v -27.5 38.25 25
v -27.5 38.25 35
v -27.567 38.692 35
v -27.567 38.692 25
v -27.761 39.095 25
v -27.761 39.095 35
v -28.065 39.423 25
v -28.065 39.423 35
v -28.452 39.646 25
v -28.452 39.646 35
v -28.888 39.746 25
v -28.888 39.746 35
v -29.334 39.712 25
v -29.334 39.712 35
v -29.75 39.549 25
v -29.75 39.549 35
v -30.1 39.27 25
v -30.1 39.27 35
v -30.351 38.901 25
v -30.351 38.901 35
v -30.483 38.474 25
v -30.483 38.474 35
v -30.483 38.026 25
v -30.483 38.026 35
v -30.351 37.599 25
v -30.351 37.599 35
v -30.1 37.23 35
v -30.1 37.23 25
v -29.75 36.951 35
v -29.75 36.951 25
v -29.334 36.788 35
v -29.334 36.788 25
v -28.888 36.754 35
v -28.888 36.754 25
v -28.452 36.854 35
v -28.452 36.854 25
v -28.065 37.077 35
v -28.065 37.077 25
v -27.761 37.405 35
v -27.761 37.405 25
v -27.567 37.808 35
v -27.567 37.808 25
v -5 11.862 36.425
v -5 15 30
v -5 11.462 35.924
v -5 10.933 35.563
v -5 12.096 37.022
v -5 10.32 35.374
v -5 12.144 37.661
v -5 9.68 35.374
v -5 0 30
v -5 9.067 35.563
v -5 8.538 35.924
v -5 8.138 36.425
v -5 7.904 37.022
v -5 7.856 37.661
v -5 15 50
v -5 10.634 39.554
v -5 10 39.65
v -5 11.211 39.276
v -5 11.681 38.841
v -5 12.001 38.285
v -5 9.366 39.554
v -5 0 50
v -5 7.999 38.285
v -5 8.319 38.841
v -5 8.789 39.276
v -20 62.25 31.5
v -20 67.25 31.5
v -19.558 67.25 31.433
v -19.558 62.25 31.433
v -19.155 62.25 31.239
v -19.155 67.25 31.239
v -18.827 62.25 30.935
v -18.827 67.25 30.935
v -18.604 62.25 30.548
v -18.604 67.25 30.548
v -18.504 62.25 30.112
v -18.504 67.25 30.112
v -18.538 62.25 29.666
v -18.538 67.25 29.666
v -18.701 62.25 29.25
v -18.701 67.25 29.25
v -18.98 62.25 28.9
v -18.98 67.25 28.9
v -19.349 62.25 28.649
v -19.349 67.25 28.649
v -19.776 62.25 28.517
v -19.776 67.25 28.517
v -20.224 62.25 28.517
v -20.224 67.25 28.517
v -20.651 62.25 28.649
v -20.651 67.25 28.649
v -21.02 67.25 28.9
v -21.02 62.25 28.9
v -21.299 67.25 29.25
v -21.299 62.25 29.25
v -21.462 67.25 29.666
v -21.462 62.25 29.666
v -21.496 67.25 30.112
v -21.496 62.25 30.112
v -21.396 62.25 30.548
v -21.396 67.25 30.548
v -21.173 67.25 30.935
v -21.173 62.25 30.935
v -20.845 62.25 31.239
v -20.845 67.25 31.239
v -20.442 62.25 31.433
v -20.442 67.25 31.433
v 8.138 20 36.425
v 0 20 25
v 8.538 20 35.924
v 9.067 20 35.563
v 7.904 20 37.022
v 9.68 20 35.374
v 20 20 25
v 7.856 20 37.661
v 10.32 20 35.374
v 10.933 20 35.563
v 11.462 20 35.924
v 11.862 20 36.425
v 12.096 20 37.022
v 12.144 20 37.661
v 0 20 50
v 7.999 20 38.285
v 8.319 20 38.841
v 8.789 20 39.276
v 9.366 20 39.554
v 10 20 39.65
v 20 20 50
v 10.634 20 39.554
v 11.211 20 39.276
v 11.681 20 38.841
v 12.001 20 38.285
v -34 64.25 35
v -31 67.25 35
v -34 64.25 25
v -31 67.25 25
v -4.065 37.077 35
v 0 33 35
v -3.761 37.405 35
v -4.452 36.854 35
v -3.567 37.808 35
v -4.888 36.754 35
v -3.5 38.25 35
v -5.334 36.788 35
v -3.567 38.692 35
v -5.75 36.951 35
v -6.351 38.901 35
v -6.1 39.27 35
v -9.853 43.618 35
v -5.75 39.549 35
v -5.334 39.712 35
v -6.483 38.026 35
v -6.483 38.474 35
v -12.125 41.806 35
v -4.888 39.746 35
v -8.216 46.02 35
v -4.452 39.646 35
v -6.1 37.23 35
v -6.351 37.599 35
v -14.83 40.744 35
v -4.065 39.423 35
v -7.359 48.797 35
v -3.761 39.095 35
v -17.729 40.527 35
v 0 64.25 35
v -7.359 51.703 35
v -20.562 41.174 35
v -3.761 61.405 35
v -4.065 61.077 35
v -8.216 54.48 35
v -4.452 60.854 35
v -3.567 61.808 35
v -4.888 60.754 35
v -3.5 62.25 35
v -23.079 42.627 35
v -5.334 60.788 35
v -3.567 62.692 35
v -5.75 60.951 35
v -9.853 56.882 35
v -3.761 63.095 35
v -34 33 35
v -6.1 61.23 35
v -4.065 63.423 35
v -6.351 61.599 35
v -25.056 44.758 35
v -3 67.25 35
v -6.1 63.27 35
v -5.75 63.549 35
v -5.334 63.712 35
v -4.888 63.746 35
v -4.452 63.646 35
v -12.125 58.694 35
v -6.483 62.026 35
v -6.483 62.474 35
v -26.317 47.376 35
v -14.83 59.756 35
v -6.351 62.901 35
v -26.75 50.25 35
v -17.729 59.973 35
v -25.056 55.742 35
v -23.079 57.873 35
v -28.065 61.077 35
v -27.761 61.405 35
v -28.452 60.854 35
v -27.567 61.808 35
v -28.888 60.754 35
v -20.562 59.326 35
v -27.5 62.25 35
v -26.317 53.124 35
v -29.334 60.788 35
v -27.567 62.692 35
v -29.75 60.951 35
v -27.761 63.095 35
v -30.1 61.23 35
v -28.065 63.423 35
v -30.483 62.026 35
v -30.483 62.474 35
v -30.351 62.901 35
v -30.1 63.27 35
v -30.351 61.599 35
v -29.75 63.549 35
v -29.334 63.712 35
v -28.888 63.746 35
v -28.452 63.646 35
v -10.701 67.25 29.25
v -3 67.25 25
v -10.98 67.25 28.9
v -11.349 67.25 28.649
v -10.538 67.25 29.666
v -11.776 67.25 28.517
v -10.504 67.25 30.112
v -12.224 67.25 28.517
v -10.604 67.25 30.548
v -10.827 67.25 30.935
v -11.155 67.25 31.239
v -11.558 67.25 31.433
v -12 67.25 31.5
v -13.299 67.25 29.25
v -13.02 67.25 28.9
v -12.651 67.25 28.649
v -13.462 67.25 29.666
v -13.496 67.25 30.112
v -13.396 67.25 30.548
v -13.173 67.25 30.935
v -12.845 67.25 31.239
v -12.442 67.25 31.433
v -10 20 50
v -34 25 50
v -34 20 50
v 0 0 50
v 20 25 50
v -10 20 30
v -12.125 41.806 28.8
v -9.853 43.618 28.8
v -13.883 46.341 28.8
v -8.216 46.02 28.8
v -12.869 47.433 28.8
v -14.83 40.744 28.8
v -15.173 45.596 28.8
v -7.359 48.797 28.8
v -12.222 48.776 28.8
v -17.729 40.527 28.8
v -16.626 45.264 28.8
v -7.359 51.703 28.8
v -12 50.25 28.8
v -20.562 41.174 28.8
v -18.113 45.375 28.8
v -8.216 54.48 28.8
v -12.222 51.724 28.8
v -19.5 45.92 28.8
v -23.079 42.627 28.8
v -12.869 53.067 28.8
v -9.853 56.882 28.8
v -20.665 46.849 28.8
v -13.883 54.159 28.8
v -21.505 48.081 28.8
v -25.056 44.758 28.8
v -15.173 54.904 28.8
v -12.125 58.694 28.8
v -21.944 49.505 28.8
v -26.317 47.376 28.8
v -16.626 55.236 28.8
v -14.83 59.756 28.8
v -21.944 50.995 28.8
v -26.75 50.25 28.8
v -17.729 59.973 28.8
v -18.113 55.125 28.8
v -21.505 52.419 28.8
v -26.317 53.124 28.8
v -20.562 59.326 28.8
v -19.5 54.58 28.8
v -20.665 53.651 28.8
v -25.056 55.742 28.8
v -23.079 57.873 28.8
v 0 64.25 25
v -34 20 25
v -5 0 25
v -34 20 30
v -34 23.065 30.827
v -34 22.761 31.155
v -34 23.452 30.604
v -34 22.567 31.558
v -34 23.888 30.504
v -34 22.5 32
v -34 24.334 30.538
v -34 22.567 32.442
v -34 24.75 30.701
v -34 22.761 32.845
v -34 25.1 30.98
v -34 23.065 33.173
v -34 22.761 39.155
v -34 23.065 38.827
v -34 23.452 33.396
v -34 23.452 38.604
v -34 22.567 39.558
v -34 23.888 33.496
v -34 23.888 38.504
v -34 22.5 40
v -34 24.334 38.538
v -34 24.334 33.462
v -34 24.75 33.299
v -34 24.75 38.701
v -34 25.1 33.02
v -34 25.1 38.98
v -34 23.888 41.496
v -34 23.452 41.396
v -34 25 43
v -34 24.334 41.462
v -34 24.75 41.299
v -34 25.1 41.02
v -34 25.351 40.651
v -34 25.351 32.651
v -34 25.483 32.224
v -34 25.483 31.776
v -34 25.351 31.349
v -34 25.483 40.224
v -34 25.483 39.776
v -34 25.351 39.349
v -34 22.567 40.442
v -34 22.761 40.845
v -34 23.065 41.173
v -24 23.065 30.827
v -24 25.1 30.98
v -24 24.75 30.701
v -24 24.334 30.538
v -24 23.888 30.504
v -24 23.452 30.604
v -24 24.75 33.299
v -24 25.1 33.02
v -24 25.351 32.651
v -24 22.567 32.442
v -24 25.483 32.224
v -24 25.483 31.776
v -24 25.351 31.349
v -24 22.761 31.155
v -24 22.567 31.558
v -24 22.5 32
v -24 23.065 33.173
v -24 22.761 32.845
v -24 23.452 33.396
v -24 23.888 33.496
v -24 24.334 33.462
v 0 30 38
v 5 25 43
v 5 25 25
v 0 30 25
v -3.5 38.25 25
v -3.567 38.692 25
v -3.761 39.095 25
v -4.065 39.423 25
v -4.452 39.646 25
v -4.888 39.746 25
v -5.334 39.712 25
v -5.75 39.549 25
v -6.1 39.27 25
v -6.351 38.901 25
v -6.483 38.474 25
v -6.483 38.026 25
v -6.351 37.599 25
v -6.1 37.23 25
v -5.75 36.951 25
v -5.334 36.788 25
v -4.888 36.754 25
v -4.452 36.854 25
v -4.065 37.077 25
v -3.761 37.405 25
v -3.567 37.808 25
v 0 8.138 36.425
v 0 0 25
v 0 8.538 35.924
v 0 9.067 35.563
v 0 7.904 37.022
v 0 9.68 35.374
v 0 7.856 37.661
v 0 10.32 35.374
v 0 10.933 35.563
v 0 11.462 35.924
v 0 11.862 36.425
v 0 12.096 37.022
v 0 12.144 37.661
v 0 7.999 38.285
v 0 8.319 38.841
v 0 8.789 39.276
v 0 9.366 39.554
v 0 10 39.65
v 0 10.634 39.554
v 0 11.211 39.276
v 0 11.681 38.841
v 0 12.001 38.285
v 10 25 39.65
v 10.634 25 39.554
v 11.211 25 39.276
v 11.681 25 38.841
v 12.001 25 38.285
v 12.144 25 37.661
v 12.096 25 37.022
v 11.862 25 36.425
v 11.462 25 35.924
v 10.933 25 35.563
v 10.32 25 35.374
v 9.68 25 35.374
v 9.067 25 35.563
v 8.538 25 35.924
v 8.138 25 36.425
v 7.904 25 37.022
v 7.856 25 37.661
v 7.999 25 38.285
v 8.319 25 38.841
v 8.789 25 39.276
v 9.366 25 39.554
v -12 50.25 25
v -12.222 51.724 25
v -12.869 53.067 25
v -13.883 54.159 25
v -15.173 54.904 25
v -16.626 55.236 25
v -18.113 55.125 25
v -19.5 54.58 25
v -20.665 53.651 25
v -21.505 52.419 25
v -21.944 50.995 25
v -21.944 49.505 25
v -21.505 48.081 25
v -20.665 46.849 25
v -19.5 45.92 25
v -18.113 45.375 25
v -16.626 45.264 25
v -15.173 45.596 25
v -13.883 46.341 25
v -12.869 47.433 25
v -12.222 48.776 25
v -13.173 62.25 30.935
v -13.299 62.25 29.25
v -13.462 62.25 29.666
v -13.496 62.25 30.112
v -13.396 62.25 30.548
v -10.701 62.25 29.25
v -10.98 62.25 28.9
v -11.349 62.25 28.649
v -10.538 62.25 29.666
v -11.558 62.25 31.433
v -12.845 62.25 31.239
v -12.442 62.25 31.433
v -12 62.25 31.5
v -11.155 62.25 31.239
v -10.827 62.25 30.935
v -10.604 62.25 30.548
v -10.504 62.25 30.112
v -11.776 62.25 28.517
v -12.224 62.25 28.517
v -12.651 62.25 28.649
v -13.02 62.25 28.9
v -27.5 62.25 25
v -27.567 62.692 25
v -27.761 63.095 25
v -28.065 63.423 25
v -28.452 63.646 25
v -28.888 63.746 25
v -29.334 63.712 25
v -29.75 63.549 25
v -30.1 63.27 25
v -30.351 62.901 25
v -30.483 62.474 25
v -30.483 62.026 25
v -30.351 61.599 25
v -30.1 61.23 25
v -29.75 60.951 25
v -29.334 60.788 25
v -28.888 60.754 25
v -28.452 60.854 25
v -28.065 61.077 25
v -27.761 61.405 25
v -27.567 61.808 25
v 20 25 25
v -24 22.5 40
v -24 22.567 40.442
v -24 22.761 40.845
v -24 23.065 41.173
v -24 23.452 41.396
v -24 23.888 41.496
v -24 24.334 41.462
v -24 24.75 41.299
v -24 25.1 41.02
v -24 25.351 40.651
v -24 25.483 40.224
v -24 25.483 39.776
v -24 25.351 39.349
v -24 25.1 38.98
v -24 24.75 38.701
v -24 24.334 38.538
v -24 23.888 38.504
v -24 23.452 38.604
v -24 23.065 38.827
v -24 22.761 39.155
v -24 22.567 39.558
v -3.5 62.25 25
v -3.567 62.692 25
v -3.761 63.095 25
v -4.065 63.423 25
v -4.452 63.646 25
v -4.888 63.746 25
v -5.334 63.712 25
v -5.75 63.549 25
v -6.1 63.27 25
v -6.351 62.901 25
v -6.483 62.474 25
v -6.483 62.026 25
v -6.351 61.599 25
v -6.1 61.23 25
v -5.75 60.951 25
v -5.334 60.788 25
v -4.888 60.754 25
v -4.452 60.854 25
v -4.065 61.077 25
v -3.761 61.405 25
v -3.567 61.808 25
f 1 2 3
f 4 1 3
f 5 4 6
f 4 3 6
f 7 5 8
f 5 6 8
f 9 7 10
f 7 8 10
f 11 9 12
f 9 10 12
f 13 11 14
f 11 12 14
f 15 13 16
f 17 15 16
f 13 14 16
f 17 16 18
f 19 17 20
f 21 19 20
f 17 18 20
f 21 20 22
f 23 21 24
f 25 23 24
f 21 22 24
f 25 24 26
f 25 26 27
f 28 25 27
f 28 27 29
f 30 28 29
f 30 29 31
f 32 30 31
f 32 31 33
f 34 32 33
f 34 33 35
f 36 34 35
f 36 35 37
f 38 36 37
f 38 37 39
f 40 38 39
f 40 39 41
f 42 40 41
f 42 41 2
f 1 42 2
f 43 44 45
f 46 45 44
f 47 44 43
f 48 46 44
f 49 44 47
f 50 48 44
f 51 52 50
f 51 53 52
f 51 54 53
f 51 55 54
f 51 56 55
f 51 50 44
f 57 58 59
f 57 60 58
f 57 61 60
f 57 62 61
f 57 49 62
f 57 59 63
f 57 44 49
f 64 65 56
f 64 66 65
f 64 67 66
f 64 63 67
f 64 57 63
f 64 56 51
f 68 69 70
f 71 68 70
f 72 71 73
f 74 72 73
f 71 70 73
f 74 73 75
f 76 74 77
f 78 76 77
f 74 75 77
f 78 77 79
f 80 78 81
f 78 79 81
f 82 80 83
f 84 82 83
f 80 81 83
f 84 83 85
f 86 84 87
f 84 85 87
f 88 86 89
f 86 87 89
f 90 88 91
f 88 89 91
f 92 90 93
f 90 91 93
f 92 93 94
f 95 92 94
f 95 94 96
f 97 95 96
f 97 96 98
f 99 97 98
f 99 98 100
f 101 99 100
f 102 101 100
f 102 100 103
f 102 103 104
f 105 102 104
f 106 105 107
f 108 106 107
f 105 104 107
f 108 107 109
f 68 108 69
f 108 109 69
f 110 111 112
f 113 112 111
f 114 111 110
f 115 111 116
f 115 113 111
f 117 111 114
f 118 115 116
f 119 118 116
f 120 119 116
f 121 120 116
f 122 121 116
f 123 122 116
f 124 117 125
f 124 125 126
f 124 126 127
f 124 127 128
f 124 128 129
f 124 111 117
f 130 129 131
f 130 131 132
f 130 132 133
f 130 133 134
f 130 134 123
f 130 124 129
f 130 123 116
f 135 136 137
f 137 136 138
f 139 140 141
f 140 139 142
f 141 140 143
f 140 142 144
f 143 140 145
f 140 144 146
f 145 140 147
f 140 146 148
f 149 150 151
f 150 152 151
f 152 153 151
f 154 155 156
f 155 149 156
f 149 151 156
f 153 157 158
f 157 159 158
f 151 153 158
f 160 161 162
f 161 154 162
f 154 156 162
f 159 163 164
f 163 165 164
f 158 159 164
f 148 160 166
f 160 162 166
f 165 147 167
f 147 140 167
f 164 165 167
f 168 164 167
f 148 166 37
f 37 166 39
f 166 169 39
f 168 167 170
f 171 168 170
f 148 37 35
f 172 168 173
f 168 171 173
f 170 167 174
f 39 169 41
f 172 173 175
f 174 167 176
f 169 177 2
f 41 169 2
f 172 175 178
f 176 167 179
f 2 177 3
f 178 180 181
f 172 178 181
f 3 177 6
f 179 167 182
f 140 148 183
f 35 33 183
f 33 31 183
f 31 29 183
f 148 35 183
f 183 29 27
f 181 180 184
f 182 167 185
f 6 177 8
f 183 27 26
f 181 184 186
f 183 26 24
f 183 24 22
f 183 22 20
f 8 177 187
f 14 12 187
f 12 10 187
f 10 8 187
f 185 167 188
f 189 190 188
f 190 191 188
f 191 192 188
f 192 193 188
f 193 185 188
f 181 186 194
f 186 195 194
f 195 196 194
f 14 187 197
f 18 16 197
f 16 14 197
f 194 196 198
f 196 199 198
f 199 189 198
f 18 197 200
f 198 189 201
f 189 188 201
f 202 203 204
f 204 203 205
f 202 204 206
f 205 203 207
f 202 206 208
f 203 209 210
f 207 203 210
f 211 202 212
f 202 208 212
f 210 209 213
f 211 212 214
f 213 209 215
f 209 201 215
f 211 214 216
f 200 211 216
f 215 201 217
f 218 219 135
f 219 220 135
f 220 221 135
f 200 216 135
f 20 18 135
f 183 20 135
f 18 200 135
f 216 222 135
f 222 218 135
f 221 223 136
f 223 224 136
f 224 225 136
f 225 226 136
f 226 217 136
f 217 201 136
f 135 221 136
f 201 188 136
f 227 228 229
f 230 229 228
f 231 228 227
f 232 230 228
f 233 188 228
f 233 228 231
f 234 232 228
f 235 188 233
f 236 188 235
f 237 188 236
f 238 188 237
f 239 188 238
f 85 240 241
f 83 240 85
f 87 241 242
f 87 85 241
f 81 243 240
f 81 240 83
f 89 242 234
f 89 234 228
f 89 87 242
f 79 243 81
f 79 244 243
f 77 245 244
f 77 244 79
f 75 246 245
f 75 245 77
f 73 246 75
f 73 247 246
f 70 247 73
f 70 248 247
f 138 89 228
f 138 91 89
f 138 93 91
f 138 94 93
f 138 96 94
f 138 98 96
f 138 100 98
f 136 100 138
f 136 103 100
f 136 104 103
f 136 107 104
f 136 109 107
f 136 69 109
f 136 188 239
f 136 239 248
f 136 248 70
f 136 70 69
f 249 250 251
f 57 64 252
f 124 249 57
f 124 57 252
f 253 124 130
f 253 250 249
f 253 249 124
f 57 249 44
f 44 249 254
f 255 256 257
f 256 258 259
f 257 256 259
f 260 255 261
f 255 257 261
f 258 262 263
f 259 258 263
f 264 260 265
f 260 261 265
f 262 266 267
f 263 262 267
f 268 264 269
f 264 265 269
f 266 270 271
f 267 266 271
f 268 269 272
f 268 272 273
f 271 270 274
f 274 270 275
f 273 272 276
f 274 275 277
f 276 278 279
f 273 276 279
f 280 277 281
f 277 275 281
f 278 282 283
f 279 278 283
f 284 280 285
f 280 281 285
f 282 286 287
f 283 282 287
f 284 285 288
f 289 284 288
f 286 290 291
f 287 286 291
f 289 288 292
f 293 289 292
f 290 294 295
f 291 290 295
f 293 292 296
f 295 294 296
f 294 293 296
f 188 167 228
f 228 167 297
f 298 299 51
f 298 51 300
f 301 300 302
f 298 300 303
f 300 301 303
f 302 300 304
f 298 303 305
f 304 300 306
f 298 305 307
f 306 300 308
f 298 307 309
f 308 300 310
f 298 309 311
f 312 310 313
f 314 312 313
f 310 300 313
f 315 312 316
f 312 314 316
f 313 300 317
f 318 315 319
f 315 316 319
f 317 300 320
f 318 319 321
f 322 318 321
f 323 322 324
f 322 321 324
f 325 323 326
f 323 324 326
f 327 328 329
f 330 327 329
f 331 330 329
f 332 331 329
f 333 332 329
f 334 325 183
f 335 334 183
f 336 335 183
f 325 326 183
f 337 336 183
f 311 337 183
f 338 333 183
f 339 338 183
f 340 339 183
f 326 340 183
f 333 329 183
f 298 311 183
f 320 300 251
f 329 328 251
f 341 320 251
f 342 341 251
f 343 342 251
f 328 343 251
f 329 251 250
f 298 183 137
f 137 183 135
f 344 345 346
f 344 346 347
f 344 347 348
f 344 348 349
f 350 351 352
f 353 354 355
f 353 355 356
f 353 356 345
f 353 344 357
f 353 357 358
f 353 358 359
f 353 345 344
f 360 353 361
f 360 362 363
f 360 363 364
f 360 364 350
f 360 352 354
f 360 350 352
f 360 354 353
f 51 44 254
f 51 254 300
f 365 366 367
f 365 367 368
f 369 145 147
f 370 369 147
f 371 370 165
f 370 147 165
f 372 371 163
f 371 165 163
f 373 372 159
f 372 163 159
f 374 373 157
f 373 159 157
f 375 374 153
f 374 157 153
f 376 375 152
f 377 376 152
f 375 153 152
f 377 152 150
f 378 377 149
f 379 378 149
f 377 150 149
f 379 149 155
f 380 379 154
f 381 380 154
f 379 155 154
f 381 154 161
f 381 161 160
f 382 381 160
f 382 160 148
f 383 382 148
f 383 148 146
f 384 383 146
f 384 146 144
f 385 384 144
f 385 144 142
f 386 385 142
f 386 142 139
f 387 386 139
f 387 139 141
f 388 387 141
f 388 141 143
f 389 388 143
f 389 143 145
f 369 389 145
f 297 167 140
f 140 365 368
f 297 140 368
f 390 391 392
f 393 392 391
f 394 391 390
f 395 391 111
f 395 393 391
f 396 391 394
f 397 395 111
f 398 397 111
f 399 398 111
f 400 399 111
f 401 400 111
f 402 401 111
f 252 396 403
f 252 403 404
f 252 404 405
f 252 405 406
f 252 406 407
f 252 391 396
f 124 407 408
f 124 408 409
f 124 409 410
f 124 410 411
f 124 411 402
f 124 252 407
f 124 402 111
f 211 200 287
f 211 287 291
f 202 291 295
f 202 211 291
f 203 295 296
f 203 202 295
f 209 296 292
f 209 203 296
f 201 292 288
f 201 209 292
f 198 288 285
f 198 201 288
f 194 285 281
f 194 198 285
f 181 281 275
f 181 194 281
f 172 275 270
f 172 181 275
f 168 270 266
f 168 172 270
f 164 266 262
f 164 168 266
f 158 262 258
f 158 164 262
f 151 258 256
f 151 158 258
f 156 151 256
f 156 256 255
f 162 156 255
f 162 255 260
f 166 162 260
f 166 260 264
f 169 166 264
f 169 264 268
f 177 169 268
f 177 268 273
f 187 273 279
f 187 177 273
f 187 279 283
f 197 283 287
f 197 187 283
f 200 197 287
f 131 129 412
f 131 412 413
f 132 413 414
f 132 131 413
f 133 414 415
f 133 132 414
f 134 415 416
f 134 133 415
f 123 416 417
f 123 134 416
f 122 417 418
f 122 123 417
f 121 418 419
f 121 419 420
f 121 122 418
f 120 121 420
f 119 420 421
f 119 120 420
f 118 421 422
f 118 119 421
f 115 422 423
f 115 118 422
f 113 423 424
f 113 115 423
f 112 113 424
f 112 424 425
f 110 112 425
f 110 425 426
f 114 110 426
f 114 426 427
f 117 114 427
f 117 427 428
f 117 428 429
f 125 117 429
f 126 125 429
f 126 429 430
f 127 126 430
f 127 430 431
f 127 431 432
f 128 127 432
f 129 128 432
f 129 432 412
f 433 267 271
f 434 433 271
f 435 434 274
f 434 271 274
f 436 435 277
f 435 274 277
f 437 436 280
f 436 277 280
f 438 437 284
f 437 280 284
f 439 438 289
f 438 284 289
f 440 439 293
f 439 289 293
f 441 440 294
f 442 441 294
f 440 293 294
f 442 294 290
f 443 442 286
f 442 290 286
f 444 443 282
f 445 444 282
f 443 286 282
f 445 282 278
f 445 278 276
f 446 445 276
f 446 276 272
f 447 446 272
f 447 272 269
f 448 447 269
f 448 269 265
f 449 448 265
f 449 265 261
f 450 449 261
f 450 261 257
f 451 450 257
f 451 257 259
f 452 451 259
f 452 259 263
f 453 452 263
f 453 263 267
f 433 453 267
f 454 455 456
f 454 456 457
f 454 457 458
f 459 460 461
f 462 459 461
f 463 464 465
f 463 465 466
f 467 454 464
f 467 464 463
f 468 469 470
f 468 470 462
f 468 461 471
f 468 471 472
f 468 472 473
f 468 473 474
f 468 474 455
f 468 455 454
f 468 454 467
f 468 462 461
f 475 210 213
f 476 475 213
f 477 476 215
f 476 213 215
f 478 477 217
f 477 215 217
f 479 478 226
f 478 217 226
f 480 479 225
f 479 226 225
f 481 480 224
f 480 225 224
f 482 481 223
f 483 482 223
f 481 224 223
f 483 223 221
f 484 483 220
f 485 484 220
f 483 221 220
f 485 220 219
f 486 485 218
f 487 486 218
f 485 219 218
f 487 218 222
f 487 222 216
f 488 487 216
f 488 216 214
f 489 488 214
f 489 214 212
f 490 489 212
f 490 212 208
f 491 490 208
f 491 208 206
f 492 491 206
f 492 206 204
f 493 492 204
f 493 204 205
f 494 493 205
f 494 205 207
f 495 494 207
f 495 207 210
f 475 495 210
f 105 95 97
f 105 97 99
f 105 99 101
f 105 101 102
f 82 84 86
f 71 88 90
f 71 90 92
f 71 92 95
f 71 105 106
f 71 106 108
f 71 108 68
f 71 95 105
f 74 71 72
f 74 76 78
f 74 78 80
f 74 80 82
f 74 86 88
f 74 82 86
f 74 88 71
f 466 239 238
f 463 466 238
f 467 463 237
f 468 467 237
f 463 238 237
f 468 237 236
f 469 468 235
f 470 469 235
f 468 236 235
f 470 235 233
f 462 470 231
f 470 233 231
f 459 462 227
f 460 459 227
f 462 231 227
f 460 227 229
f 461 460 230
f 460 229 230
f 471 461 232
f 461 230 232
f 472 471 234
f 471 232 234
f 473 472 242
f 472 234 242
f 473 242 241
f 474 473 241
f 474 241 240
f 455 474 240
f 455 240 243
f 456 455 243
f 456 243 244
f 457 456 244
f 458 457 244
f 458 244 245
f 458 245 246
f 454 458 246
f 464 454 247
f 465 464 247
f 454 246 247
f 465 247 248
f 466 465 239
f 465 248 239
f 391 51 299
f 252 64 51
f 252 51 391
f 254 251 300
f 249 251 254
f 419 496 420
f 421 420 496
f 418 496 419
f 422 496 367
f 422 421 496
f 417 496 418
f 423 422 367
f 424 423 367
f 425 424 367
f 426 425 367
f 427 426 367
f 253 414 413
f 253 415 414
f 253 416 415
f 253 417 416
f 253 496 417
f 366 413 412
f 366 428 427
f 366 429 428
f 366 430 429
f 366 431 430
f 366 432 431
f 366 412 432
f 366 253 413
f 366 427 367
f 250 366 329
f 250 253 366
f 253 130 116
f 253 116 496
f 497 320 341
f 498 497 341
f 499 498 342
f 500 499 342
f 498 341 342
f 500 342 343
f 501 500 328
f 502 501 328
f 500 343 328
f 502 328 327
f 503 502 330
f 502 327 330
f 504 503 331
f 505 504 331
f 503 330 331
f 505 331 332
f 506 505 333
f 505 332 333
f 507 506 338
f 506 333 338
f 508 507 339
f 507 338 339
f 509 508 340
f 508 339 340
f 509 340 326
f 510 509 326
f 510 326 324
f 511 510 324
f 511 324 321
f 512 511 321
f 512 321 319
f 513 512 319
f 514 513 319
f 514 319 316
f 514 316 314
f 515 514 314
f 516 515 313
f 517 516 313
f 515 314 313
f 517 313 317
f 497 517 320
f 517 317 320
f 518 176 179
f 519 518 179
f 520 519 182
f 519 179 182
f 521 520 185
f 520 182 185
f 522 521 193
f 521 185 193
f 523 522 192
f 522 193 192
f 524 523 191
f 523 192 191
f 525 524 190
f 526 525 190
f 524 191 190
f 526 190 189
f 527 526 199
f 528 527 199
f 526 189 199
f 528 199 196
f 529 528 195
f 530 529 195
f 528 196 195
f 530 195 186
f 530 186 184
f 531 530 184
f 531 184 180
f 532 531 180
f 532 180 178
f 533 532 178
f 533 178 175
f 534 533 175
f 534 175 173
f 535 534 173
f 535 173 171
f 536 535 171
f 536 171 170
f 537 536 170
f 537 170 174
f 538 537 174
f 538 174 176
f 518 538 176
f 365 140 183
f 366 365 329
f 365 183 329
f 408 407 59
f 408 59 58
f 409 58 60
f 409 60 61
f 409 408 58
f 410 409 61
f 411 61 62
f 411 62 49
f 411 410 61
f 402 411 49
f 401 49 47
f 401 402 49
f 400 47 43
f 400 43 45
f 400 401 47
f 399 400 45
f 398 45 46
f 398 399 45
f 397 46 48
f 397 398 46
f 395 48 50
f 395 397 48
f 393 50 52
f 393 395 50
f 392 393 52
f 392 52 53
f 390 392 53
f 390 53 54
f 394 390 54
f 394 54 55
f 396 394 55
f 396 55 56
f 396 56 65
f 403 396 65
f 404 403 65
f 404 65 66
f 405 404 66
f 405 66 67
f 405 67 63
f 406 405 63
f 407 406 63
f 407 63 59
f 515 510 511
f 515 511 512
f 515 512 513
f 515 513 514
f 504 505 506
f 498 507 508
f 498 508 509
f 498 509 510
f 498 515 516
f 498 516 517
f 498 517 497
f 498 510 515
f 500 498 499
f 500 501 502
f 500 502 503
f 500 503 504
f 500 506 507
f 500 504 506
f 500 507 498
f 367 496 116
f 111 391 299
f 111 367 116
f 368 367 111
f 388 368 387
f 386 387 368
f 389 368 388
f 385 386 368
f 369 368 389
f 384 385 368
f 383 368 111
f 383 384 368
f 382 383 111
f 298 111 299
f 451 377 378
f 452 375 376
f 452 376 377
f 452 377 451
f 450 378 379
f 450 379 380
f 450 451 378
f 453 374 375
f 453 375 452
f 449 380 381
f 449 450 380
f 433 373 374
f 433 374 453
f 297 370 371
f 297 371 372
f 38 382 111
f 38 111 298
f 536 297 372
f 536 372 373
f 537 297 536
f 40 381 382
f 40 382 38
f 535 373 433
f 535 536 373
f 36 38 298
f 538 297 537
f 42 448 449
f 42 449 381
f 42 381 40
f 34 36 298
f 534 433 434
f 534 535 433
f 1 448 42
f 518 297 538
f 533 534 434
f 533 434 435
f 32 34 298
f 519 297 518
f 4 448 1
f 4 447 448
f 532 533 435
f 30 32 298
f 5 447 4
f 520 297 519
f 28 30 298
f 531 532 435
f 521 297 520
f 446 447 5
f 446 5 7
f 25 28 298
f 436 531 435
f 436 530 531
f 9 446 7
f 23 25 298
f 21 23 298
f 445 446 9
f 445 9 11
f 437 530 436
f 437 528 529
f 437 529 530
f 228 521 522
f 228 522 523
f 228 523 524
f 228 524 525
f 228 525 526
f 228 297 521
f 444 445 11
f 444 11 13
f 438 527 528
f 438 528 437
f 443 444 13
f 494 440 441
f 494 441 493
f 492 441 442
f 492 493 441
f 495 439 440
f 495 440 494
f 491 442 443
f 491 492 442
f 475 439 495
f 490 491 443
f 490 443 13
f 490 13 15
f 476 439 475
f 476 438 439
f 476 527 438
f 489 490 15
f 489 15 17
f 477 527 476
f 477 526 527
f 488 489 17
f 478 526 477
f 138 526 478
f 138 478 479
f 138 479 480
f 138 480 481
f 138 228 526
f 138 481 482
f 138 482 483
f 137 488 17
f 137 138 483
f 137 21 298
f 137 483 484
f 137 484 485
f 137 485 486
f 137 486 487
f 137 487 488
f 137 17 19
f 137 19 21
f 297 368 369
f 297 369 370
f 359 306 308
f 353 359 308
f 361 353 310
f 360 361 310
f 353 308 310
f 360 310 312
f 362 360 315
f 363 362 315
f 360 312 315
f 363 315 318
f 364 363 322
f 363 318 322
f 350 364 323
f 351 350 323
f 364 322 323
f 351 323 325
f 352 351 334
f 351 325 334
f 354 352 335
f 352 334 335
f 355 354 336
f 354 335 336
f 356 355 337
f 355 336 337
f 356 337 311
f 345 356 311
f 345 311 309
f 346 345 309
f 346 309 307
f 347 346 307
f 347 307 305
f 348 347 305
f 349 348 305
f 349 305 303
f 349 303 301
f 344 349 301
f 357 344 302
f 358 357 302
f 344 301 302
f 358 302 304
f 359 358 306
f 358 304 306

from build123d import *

# Parameters (mm, degrees)
SKETCH_1_R          = 5
SKETCH_1_R_2        = 1.5
EXTRUDE_1_DEPTH     = 25
SKETCH_2_R          = 2.15
CUT_EXTRUDE_1_DEPTH = 30
SKETCH_3_R          = 2.15
CUT_EXTRUDE_2_DEPTH = 30
SKETCH_4_W          = 34
SKETCH_4_H          = 42.25
CUT_EXTRUDE_3_DEPTH = 15
CHAMFER_1_SIZE      = 5
CHAMFER_2_SIZE      = 3
SKETCH_6_R          = 9.75
CUT_EXTRUDE_5_DEPTH = 6.2
EXTRUDE_2_DEPTH     = 5
SKETCH_8_W          = 91.561993536
SKETCH_8_H          = 85.949306993
CUT_EXTRUDE_6_DEPTH = 25
CHAMFER_3_SIZE      = 8
SKETCH_9_R          = 1.5
CUT_EXTRUDE_7_DEPTH = 10
SKETCH_10_R         = 1.5
CUT_EXTRUDE_8_DEPTH = 5


with BuildPart() as part:
    # 草图1 → 凸台-拉伸1 (new body)
    with BuildSketch(Plane.XY):
        Polygon((0, 0), (0, 20), (20, 20), (20, 25), (0, 25), (0, 67.25), (-34, 67.25), (-34, 20), (-5, 20), (-5, 0), align=None)
        with Locations((-17, 50.25)):
            Circle(SKETCH_1_R, mode=Mode.SUBTRACT)
        with Locations((-29, 62.25)):
            Circle(SKETCH_1_R_2, mode=Mode.SUBTRACT)
        with Locations((-5, 62.25)):
            Circle(SKETCH_1_R_2, mode=Mode.SUBTRACT)
        with Locations((-29, 38.25)):
            Circle(SKETCH_1_R_2, mode=Mode.SUBTRACT)
        with Locations((-5, 38.25)):
            Circle(SKETCH_1_R_2, mode=Mode.SUBTRACT)
    extrude(amount=EXTRUDE_1_DEPTH)

    # 草图2 → 切除-拉伸1 (cut)
    with BuildSketch(Plane(origin=(0, 0, 0), x_dir=(0, 0, -1), z_dir=(1, 0, 0))):
        with Locations((-12.5, 10)):
            Circle(SKETCH_2_R)
    extrude(amount=-CUT_EXTRUDE_1_DEPTH, mode=Mode.SUBTRACT)

    # 草图3 → 切除-拉伸2 (cut)
    with BuildSketch(Plane.XZ.offset(-20)):
        with Locations(Location((10, 12.5, 0), (0, 0, 270))):
            Circle(SKETCH_3_R)
    extrude(amount=-CUT_EXTRUDE_2_DEPTH, mode=Mode.SUBTRACT)

    # 草图4 → 切除-拉伸3 (cut)
    with BuildSketch(Plane(origin=(0, 0, 0), x_dir=(-1, 0, 0), z_dir=(0, 0, -1))):
        with Locations((17, 46.125)):
            Rectangle(SKETCH_4_W, SKETCH_4_H)
    extrude(amount=-CUT_EXTRUDE_3_DEPTH, mode=Mode.SUBTRACT)

    # 倒角1
    chamfer_1_edges = [part.edges().sort_by_distance(p)[0] for p in [
        (-5, 20, 12.5),
        (0, 25, 20),
    ]]
    chamfer(chamfer_1_edges, length=CHAMFER_1_SIZE)

    # 倒角2
    chamfer_2_edges = [part.edges().sort_by_distance(p)[0] for p in [
        (-34, 67.25, 20),
        (0, 67.25, 20),
    ]]
    chamfer(chamfer_2_edges, length=CHAMFER_2_SIZE)

    # 草图6 → 切除-拉伸5 (cut)
    with BuildSketch(Plane(origin=(0, 0, 15), x_dir=(-1, 0, 0), z_dir=(0, 0, -1))):
        with Locations((17, 50.25)):
            Circle(SKETCH_6_R)
    extrude(amount=-CUT_EXTRUDE_5_DEPTH, mode=Mode.SUBTRACT)

    # 草图7 → 凸台-拉伸2 (add)
    with BuildSketch(Plane.XY.offset(25)):
        Polygon((-34, 20), (-10, 20), (-5, 15), (-5, 0), align=None)
    extrude(amount=-EXTRUDE_2_DEPTH)


with BuildPart() as body_2:
    # 镜向1: mirrored copy
    add(part.part.mirror(Plane.XY.offset(25)))

    # 倒角3
    # the kernel refuses this chamfer: 8 mm, written as the material it adds along each edge
    with BuildSketch(Plane(origin=(-34, 25, 35), x_dir=(0, 0.9996219169112968, -0.027495876610586487), z_dir=(1, 0, 0))) as chamfer_3_piece_1_section:
        Polygon((CHAMFER_3_SIZE * 0.999621916911, CHAMFER_3_SIZE * 0.0274958766106), (-CHAMFER_3_SIZE * 0.0274958766106, CHAMFER_3_SIZE * 0.999621916911), (0, 0), align=None)
    chamfer_3_piece_1 = extrude(amount=59.573463904, mode=Mode.PRIVATE)
    chamfer_3_piece_1 = split(chamfer_3_piece_1, bisect_by=Plane(origin=(0, 27.617876763, 37.64907513), z_dir=(-1, 0, 0)), keep=Keep.TOP, mode=Mode.PRIVATE)
    chamfer_3_piece_1 = split(chamfer_3_piece_1, bisect_by=Plane(origin=(-7.349818702, 37.349818702, 37.64907513), z_dir=(-0.7071067811865476, -0.7071067811865476, 0)), keep=Keep.TOP, mode=Mode.PRIVATE)
    add(chamfer_3_piece_1)
    with BuildSketch(Plane(origin=(-34, 25, 35), x_dir=(0, 0.9996219169112968, -0.027495876610586487), z_dir=(1, 0, 0))) as chamfer_3_piece_2_section:
        Polygon((CHAMFER_3_SIZE * 0.999621916911, CHAMFER_3_SIZE * 0.0274958766106), (-CHAMFER_3_SIZE * 0.0274958766106, CHAMFER_3_SIZE * 0.999621916911), (0, 0), align=None)
    chamfer_3_piece_2 = extrude(amount=59.573463904, mode=Mode.PRIVATE)
    chamfer_3_piece_2 = split(chamfer_3_piece_2, bisect_by=Plane(origin=(0, 26.307184644, 38.352912701), z_dir=(1, 0, 0)), keep=Keep.TOP, mode=Mode.PRIVATE)
    chamfer_3_piece_2 = split(chamfer_3_piece_2, bisect_by=Plane(origin=(2.769611517, 27.230388483, 38.352912701), z_dir=(-0.7071067811865476, -0.7071067811865476, 0)), keep=Keep.TOP, mode=Mode.PRIVATE)
    add(chamfer_3_piece_2)
    with BuildSketch(Plane(origin=(-34, 25, 35), x_dir=(0, 0.9996219169112968, -0.027495876610586487), z_dir=(1, 0, 0))) as chamfer_3_piece_3_section:
        Polygon((CHAMFER_3_SIZE * 0.999621916911, CHAMFER_3_SIZE * 0.0274958766106), (-CHAMFER_3_SIZE * 0.0274958766106, CHAMFER_3_SIZE * 0.999621916911), (0, 0), align=None)
    chamfer_3_piece_3 = extrude(amount=59.573463904, mode=Mode.PRIVATE)
    chamfer_3_piece_3 = split(chamfer_3_piece_3, bisect_by=Plane(origin=(0, 31.684169789, 35.518604569), z_dir=(-1, 0, 0)), keep=Keep.TOP, mode=Mode.PRIVATE)
    chamfer_3_piece_3 = split(chamfer_3_piece_3, bisect_by=Plane(origin=(-1.263127342, 31.263127342, 35.518604569), z_dir=(0.7071067811865476, 0.7071067811865476, 0)), keep=Keep.TOP, mode=Mode.PRIVATE)
    add(chamfer_3_piece_3)

    # 草图9 → 切除-拉伸7 (cut)
    with BuildSketch(Plane.ZY.offset(34)):
        with Locations(Location((40, 24, 0), (0, 0, 270))):
            Circle(SKETCH_9_R)
        with Locations(Location((32, 24, 0), (0, 0, 270))):
            Circle(SKETCH_9_R)
    extrude(amount=-CUT_EXTRUDE_7_DEPTH, mode=Mode.SUBTRACT)

    # 草图10 → 切除-拉伸8 (cut)
    with BuildSketch(Plane(origin=(0, 67.25, 0), x_dir=(1, 0, 0), z_dir=(0, 1, 0))):
        with Locations(Location((-12, -30, 0), (0, 0, 270))):
            Circle(SKETCH_10_R)
        with Locations(Location((-20, -30, 0), (0, 0, 270))):
            Circle(SKETCH_10_R)
    extrude(amount=-CUT_EXTRUDE_8_DEPTH, mode=Mode.SUBTRACT)


with BuildPart() as part_1:
    add(part.part)

    # 草图8 → 切除-拉伸6 (cut)
    with BuildSketch(Plane(origin=(0, 0, 0), x_dir=(-1, 0, 0), z_dir=(0, 0, -1))):
        with Locations((16.502686865, 35.124779943)):
            Rectangle(SKETCH_8_W, SKETCH_8_H)
    extrude(amount=-CUT_EXTRUDE_6_DEPTH, mode=Mode.SUBTRACT)


solid = body_2.part
